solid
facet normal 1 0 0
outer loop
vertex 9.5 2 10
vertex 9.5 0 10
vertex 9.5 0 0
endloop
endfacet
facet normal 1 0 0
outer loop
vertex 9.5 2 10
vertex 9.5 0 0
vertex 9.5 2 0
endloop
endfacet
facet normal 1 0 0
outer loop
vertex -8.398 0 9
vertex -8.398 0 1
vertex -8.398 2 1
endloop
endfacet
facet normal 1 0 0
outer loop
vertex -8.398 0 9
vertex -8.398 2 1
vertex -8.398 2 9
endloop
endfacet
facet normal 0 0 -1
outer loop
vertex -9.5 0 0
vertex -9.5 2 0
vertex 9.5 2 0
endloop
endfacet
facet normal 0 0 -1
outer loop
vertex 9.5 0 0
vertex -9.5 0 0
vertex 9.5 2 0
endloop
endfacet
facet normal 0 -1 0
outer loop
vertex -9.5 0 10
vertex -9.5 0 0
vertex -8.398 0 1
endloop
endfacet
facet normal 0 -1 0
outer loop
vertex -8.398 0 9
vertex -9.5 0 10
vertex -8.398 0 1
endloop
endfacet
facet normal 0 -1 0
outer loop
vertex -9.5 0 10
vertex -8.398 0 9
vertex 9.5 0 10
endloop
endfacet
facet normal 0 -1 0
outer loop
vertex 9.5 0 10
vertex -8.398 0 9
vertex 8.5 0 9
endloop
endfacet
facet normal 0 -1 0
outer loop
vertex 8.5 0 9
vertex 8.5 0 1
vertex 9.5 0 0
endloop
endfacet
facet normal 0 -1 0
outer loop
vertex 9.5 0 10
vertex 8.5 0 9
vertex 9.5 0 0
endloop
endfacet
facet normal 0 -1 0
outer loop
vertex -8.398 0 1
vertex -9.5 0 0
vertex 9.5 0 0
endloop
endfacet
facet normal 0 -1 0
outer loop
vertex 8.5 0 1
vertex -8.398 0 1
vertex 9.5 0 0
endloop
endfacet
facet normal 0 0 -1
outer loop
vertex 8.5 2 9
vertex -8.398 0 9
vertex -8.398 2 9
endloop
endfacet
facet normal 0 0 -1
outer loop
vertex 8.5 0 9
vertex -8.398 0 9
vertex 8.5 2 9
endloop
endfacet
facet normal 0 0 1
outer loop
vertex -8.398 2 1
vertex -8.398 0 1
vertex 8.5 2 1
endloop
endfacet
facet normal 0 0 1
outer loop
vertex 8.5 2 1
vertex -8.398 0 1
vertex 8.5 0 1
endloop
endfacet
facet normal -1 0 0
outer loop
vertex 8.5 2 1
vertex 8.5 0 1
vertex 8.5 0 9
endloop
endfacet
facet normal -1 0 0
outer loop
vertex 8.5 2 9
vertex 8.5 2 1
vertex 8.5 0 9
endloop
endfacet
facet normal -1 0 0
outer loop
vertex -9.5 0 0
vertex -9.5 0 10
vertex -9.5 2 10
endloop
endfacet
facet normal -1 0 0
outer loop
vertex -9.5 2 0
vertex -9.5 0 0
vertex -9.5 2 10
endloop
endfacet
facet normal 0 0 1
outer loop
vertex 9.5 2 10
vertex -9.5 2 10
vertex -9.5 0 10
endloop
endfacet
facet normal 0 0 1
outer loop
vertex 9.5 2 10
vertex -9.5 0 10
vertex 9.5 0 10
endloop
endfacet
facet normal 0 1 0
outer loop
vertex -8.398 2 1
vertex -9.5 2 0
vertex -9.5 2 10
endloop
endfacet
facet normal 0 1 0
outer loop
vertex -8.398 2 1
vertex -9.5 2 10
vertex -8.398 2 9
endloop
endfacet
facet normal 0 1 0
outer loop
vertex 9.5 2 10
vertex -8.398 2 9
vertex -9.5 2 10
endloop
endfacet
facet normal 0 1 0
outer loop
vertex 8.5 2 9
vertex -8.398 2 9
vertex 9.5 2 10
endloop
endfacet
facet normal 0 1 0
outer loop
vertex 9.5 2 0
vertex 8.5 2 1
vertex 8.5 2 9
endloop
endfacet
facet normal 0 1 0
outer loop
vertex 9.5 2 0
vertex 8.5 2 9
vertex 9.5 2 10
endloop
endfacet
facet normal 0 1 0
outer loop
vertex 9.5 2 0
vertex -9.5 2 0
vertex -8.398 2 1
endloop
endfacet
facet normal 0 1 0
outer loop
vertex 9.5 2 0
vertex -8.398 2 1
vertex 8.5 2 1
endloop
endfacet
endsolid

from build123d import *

# Parameters (mm, degrees)
SKETCH005_W      = 16.898421
SKETCH005_H      = 8
EXTRUDE004_DEPTH = 2.5
SKETCH_W         = 19
SKETCH_H         = 2
EXTRUDE_DEPTH    = 10


with BuildPart() as extrude004:
    # Sketch005 (on Face2 of Extrude) → Extrude004 (new body, symmetric)
    with BuildSketch(Plane.XZ):
        with Locations((0.05079, 5)):
            Rectangle(SKETCH005_W, SKETCH005_H)
    extrude(amount=EXTRUDE004_DEPTH, both=True)


with BuildPart() as cut001:
    # Sketch → Extrude (new body)
    with BuildSketch(Plane.XY):
        with Locations((0, 1)):
            Rectangle(SKETCH_W, SKETCH_H)
    extrude(amount=EXTRUDE_DEPTH)

    # Cut001: cut Extrude004
    add(extrude004.part, mode=Mode.SUBTRACT)


solid = cut001.part
